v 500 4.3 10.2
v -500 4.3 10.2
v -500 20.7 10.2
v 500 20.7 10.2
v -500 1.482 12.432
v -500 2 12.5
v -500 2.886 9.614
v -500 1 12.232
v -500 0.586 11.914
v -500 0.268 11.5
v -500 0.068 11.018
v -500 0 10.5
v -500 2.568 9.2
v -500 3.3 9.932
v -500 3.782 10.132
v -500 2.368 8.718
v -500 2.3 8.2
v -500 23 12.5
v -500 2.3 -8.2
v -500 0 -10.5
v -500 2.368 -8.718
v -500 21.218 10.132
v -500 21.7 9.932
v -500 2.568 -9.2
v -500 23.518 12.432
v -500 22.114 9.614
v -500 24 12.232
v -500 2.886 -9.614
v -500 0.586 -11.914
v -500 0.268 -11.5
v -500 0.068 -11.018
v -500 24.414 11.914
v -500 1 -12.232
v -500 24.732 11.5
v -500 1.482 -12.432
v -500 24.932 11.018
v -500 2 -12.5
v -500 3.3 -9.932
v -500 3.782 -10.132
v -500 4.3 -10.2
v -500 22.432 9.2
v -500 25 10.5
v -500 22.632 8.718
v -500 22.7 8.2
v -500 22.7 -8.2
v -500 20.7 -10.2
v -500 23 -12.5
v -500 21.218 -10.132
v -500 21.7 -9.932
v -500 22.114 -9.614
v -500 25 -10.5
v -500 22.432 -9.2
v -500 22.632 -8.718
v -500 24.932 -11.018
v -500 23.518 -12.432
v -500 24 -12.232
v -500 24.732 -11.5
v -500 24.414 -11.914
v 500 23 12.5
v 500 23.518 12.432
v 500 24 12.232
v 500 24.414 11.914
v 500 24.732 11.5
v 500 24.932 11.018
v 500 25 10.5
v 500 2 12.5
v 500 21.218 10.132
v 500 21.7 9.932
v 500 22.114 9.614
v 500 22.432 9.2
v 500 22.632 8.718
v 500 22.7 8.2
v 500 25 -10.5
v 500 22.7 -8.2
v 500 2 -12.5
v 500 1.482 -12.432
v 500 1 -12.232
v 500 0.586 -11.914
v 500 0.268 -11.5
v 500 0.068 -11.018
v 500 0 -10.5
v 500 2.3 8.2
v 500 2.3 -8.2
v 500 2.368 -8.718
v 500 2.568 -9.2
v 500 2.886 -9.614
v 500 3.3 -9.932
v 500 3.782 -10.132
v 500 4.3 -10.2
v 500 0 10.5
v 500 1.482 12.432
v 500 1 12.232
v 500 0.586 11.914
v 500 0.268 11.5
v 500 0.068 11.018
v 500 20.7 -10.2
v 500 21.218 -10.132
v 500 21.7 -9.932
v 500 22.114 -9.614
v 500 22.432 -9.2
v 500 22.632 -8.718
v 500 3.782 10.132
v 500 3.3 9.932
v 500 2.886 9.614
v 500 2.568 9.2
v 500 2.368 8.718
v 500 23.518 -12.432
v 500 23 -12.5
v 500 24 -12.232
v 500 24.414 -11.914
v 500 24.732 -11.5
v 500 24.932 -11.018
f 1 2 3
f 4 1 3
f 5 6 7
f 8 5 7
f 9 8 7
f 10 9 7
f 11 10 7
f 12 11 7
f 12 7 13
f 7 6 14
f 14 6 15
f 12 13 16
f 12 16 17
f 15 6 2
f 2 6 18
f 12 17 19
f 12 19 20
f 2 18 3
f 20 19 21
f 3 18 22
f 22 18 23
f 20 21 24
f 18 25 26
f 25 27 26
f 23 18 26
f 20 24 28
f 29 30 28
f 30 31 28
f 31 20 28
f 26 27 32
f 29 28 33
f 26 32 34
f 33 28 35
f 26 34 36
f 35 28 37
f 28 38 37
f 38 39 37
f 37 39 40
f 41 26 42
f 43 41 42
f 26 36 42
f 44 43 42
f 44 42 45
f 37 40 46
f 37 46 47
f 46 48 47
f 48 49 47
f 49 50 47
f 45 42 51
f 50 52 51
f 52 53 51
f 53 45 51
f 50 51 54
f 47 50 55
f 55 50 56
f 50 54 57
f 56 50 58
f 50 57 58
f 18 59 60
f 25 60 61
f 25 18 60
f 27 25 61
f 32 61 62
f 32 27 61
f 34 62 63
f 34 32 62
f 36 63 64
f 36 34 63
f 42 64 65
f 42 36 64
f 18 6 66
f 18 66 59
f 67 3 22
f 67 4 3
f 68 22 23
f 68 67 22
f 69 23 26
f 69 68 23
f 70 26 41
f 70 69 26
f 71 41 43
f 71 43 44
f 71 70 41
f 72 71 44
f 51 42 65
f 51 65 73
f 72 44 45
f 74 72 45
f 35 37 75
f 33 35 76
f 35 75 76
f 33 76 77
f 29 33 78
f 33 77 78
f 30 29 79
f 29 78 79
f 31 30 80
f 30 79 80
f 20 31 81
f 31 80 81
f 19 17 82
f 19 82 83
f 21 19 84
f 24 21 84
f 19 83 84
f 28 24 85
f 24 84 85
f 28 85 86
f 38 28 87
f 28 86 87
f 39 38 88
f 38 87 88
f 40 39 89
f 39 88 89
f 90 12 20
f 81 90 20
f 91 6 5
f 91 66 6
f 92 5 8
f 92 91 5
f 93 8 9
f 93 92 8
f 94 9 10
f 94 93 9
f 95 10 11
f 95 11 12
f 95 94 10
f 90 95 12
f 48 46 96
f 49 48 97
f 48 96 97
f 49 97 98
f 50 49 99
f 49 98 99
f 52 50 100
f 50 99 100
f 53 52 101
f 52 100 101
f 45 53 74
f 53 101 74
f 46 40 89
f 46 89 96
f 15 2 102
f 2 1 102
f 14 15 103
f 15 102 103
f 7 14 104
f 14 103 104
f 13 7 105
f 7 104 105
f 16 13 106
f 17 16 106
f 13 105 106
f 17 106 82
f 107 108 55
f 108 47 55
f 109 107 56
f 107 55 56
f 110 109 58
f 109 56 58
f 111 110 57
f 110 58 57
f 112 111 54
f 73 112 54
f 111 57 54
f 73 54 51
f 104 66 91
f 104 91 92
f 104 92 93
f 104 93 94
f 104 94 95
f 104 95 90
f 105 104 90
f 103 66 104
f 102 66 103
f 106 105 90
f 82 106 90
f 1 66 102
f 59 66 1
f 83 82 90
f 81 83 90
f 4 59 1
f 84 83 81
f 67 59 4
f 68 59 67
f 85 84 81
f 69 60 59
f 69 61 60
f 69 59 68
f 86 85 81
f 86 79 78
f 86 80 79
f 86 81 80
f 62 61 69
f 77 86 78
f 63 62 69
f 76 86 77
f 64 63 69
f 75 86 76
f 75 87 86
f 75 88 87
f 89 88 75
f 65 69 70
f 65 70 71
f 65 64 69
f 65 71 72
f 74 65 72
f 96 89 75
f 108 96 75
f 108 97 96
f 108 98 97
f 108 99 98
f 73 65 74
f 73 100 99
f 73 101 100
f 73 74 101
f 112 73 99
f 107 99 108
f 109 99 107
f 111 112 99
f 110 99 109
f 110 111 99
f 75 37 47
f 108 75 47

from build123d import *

# Parameters (mm, degrees)
SKETCH1_W               = 25
SKETCH1_H               = 25
BOSS_EXTRUDE1_DEPTH     = 500
FILLET1_R               = 2
CUT_EXTRUDE1_DEPTH      = 1001.390548736
CUT_EXTRUDE1_DEPTH_BACK = 1001.390548736
SKETCH2_W               = 20.4
SKETCH2_H               = 20.4
FILLET2_R               = 2


with BuildPart() as part:
    # Sketch1 → Boss-Extrude1 (new, symmetric)
    with BuildSketch(Plane(origin=(0, 0, 0), x_dir=(0, 0, -1), z_dir=(1, 0, 0))):
        with Locations((0, 12.5)):
            Rectangle(SKETCH1_W, SKETCH1_H)
    extrude(amount=BOSS_EXTRUDE1_DEPTH, both=True)

    # Fillet1
    fillet1_edges = [part.edges().sort_by_distance(p)[0] for p in [
        (0, 25, 12.5),
        (0, 25, -12.5),
        (0, 0, -12.5),
        (0, 0, 12.5),
    ]]
    fillet(fillet1_edges, radius=FILLET1_R)

    # Sketch2 → Cut-Extrude1 (cut, two sides: drawn at the far end of the back side and taken through both)
    with BuildSketch(Plane(origin=(500, 0, 0), x_dir=(0, 0, -1), z_dir=(1, 0, 0)).offset(-CUT_EXTRUDE1_DEPTH_BACK)):
        with Locations((0, 12.5)):
            Rectangle(SKETCH2_W, SKETCH2_H)
    extrude(amount=CUT_EXTRUDE1_DEPTH + CUT_EXTRUDE1_DEPTH_BACK, mode=Mode.SUBTRACT)

    # Fillet2
    fillet2_edges = [part.edges().sort_by_distance(p)[0] for p in [
        (0, 22.7, 10.2),
        (0, 22.7, -10.2),
        (0, 2.3, -10.2),
        (0, 2.3, 10.2),
    ]]
    fillet(fillet2_edges, radius=FILLET2_R)


solid = part.part
